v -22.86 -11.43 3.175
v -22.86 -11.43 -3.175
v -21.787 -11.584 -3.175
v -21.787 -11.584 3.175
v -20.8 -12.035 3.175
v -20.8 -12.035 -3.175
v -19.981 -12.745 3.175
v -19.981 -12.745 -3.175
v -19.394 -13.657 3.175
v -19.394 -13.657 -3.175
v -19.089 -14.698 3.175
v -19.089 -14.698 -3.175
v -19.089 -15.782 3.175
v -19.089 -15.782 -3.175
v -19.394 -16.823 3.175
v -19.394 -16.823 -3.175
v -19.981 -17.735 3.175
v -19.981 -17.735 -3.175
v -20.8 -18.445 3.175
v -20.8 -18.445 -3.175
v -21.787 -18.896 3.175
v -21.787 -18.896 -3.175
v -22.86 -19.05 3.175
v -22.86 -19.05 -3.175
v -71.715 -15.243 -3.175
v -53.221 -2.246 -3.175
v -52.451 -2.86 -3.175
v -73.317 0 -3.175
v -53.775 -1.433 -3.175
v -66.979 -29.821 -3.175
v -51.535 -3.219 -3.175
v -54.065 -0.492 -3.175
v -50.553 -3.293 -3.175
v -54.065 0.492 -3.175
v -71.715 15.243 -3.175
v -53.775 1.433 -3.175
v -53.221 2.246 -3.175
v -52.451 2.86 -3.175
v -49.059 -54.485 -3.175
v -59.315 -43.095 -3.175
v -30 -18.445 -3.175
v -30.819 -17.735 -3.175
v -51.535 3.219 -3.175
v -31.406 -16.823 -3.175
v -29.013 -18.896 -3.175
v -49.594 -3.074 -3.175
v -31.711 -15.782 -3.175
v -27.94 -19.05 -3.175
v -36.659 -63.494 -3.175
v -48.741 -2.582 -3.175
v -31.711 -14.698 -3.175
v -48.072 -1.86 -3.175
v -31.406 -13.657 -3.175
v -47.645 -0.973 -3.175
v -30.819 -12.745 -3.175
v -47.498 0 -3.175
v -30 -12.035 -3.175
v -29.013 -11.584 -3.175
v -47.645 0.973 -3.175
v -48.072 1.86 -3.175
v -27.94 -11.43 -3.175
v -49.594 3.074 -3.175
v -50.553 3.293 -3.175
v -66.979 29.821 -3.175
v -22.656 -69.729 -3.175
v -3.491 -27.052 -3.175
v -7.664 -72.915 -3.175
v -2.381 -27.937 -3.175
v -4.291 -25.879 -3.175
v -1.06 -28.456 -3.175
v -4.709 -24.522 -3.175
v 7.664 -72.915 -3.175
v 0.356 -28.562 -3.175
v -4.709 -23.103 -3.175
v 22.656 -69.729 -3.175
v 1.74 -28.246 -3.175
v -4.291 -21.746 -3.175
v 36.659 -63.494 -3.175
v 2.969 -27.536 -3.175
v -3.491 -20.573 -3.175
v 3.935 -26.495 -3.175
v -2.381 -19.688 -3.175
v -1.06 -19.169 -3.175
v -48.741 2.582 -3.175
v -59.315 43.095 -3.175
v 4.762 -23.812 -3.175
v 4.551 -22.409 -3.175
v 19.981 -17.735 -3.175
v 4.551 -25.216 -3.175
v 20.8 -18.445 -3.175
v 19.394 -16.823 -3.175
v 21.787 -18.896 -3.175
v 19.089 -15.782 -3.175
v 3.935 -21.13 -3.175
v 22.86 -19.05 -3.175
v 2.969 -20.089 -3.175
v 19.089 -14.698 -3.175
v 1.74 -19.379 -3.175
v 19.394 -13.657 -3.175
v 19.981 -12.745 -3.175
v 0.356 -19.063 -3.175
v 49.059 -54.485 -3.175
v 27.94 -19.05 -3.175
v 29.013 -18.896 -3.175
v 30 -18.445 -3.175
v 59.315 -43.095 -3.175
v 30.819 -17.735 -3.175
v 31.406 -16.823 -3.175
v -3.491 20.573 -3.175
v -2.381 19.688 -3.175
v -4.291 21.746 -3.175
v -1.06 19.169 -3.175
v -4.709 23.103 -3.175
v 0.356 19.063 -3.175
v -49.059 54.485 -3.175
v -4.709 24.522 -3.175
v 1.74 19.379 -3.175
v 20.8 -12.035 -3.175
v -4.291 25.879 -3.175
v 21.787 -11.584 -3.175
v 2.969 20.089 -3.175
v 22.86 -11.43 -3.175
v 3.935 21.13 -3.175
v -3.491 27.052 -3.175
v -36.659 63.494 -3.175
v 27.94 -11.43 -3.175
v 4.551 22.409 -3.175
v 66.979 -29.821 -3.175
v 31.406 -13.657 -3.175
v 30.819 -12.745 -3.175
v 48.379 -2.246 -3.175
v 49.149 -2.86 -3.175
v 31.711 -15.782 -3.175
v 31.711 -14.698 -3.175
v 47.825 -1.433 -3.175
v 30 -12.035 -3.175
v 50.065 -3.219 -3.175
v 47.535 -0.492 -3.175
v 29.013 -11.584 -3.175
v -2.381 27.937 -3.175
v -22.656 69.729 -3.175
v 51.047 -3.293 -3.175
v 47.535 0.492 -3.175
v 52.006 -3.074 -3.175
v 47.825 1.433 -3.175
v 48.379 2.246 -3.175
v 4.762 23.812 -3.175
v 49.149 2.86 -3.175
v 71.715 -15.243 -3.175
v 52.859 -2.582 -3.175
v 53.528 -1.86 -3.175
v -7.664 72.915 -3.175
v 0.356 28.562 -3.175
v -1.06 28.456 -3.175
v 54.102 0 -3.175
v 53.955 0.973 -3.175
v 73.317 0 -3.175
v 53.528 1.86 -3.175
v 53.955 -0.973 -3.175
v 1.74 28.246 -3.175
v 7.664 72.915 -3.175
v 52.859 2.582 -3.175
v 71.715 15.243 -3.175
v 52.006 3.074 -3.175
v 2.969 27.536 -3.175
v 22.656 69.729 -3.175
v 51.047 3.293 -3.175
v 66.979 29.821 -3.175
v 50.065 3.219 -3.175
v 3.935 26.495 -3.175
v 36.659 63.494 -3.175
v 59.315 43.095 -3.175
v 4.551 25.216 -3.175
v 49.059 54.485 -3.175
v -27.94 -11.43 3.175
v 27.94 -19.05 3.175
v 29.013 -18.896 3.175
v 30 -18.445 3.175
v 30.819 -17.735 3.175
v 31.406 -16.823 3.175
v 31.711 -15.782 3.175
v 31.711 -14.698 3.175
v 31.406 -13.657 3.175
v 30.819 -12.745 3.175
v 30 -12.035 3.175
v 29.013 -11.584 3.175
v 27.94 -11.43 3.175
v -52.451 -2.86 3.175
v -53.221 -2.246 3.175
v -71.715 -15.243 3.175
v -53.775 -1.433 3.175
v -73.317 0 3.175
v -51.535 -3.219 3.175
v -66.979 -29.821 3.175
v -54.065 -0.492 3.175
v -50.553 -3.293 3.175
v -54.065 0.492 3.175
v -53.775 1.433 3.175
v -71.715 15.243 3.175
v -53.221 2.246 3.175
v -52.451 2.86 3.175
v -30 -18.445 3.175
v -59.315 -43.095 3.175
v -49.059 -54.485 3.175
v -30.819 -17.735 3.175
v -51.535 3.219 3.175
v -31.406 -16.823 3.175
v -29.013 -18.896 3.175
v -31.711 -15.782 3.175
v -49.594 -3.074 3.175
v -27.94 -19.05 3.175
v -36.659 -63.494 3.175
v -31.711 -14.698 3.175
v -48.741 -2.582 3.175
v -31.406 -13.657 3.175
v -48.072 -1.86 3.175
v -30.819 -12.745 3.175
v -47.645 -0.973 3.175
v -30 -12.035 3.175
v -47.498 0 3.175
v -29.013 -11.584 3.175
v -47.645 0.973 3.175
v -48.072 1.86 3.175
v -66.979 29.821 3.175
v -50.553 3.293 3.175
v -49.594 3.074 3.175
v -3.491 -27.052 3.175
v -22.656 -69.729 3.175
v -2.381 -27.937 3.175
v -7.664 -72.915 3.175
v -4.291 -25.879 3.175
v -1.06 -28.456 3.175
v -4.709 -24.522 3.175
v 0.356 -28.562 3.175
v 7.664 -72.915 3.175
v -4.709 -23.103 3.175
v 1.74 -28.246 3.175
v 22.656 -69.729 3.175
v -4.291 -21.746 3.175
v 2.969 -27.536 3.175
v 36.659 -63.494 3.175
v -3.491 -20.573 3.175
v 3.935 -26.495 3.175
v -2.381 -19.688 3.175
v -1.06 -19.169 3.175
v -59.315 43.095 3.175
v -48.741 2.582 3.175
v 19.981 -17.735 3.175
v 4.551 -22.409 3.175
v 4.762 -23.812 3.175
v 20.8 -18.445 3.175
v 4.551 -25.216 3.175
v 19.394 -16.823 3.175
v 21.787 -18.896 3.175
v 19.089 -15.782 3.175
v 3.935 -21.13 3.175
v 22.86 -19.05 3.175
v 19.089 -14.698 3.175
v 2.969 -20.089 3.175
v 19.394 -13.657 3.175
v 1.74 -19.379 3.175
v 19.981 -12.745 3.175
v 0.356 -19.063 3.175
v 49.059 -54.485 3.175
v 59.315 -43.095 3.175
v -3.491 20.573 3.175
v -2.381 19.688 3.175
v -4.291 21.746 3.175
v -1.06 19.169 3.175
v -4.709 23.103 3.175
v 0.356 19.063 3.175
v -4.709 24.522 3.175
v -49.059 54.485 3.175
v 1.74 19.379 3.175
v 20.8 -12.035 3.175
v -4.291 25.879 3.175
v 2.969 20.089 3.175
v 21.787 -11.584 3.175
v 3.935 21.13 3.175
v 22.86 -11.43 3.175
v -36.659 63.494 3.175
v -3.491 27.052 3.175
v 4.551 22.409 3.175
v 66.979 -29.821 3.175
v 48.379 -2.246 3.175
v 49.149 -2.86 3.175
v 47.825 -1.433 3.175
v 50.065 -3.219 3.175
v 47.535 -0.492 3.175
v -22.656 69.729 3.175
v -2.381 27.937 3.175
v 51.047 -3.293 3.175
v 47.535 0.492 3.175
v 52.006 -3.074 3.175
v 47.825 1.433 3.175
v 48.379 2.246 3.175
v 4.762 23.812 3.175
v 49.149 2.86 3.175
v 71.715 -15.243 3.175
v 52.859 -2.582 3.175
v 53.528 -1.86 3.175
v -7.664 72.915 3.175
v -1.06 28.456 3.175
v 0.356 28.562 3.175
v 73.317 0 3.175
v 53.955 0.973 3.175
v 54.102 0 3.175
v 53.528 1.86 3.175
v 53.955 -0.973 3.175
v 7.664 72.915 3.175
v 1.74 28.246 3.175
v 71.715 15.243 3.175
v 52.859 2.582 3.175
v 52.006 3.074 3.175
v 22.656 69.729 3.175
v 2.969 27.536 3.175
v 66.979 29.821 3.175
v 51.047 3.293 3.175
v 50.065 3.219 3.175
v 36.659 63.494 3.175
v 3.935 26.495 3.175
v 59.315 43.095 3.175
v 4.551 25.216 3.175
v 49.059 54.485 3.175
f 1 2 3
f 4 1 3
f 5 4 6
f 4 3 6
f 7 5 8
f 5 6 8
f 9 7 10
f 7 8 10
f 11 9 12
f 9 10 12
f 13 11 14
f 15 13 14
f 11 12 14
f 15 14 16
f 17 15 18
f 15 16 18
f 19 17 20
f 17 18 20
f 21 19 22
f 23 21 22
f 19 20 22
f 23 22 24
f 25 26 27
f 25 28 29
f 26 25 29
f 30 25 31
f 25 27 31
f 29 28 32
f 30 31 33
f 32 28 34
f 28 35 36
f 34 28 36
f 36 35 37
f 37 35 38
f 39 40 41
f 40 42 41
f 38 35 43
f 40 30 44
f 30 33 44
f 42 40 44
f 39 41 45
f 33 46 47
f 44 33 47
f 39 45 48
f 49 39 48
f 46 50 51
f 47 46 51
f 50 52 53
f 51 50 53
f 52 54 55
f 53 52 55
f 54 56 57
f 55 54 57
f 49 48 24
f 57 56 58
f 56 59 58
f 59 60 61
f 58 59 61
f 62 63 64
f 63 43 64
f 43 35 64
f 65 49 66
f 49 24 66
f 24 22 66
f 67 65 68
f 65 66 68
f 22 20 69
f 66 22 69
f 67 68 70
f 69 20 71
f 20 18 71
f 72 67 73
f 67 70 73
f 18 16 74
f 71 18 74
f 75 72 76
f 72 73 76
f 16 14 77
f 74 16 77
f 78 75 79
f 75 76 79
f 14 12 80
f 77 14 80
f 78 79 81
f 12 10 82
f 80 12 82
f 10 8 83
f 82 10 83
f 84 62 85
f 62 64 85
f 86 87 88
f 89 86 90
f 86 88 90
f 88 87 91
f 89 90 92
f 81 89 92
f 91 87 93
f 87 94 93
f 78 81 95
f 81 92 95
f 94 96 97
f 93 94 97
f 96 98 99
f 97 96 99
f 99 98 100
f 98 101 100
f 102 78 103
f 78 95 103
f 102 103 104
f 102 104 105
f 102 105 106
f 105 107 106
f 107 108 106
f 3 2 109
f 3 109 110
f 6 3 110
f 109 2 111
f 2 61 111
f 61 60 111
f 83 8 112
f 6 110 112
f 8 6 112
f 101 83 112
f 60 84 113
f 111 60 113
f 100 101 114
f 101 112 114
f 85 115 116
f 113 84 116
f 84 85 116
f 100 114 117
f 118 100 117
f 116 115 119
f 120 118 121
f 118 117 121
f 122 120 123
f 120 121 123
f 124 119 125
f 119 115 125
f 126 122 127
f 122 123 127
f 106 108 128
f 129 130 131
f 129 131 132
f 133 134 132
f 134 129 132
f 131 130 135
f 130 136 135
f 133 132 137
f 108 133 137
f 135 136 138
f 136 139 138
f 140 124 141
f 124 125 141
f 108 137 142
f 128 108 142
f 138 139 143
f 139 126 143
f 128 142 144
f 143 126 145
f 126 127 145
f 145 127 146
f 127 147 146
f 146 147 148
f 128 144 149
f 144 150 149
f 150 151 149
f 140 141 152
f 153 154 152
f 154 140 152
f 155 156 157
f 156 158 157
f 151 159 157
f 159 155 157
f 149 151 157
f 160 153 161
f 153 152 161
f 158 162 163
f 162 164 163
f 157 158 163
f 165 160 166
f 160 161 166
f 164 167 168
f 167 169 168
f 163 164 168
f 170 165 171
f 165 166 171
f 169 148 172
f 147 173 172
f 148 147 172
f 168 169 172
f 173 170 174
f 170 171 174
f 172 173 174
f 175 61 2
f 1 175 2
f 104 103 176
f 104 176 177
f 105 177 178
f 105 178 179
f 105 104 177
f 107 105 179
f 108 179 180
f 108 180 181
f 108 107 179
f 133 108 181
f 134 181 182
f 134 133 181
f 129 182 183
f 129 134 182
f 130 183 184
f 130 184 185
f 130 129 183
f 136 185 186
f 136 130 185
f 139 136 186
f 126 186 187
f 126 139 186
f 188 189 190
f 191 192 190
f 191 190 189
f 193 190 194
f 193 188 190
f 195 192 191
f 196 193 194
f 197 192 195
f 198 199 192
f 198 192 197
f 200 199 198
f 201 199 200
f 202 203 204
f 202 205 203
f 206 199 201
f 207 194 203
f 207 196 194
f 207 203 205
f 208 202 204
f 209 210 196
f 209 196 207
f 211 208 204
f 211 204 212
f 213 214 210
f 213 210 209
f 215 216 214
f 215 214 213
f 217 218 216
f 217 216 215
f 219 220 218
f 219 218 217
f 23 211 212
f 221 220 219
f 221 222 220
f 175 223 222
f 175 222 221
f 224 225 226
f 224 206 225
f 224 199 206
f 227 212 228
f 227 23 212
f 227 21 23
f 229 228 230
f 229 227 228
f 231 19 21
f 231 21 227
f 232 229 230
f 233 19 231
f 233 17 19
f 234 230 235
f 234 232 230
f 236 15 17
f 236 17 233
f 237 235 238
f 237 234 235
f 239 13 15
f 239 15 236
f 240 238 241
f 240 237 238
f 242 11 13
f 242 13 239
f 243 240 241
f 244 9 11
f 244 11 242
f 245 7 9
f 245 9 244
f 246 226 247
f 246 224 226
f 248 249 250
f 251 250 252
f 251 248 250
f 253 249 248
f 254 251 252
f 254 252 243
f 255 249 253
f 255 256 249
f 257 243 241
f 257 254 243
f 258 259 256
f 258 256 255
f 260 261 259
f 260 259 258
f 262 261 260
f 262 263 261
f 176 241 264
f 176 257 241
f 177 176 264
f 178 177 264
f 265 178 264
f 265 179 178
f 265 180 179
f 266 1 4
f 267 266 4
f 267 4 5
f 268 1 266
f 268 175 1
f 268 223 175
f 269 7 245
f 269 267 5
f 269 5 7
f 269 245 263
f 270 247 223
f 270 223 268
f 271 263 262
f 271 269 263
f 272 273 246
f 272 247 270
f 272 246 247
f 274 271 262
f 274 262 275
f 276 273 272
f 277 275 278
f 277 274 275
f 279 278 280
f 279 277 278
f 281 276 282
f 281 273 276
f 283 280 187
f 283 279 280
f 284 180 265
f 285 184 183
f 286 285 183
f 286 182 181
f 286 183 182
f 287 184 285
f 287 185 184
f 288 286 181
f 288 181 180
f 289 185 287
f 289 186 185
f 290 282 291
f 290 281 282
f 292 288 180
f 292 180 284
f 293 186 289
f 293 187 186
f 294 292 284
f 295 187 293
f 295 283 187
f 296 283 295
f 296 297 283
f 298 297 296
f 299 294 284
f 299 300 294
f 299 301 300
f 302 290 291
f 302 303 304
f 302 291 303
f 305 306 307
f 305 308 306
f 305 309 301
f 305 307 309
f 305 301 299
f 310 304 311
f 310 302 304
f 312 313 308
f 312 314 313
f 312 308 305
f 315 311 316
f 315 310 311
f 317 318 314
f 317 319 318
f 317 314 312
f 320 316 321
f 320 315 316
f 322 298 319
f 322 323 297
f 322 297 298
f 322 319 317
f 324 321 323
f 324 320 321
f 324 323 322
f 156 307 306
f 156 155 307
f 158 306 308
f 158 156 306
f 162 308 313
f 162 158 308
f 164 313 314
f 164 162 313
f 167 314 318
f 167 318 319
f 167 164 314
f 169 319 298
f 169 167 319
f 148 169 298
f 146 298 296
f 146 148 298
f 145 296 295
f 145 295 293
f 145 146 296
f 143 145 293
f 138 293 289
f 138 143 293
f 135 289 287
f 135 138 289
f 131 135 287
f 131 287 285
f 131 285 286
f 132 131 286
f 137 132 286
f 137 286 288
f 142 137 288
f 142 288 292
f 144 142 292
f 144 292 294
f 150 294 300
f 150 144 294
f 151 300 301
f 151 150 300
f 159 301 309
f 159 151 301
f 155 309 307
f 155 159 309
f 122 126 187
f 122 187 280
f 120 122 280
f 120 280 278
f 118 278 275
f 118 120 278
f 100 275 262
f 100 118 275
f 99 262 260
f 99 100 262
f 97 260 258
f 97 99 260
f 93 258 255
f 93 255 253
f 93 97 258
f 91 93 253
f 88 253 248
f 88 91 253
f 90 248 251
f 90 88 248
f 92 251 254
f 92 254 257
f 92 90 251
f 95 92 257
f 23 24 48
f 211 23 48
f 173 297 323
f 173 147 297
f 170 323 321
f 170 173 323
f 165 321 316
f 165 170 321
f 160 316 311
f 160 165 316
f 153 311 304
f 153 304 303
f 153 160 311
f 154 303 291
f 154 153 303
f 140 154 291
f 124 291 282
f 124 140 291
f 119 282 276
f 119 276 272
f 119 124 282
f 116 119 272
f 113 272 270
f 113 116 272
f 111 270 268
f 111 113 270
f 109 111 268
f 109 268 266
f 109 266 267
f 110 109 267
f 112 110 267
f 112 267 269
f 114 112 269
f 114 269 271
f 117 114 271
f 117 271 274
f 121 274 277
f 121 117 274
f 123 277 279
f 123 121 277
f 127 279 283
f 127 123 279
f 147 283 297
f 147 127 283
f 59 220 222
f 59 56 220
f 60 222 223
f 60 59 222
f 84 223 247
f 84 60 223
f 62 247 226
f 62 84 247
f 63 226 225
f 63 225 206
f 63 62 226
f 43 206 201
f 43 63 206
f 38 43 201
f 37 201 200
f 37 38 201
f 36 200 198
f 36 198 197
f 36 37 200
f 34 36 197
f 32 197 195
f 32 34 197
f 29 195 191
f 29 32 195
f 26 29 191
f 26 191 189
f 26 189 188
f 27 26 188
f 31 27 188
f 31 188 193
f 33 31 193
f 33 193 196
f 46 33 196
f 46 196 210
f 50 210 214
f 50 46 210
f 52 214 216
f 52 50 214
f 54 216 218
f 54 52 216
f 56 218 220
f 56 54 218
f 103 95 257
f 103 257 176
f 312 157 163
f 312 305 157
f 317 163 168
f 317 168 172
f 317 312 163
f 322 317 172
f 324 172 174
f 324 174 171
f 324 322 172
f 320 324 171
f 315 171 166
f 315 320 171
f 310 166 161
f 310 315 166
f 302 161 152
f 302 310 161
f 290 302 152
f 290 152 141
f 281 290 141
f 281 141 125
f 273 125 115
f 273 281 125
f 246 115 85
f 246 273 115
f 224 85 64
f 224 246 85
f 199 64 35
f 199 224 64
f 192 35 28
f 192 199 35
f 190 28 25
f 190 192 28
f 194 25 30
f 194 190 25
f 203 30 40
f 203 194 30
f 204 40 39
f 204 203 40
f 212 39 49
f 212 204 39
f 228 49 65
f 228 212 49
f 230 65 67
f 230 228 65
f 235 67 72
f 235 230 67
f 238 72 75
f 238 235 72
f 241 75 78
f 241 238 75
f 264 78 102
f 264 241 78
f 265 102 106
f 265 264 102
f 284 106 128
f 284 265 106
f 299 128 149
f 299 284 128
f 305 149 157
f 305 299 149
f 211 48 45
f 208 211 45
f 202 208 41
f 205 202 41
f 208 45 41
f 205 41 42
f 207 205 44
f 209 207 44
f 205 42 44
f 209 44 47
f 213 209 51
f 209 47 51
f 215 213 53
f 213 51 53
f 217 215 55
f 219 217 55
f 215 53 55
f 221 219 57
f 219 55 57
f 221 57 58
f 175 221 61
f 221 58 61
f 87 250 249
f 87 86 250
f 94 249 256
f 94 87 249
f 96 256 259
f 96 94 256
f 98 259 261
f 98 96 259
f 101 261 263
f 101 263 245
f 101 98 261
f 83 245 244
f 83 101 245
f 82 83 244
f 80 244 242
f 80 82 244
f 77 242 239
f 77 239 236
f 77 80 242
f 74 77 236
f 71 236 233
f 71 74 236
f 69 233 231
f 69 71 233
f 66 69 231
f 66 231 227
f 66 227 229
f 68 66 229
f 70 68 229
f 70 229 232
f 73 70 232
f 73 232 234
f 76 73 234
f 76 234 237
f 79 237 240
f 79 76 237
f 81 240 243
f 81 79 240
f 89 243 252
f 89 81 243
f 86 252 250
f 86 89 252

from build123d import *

# Parameters (mm, degrees)
SKETCH2_R           = 73.3171
SKETCH2_R_2         = 3.302
SKETCH2_R_3         = 4.7625
BOSS_EXTRUDE1_DEPTH = 3.175
CUT_EXTRUDE1_DEPTH  = 6.35


with BuildPart() as part:
    # Sketch2 → Boss-Extrude1 (new, symmetric)
    with BuildSketch(Plane.XY):
        Circle(SKETCH2_R)
        with Locations((-50.8, 0)):
            Circle(SKETCH2_R_2, mode=Mode.SUBTRACT)
        with Locations((50.8, 0)):
            Circle(SKETCH2_R_2, mode=Mode.SUBTRACT)
        with Locations((0, 23.8125)):
            Circle(SKETCH2_R_3, mode=Mode.SUBTRACT)
        with Locations((0, -23.8125)):
            Circle(SKETCH2_R_3, mode=Mode.SUBTRACT)
    extrude(amount=BOSS_EXTRUDE1_DEPTH, both=True)

    # Sketch3 → Cut-Extrude1 (cut)
    with BuildSketch(Plane(origin=(0, 0, -3.175), x_dir=(-1, 0, 0), z_dir=(0, 0, -1))):
        with BuildLine():
            Line((-27.94, -11.43), (-22.86, -11.43))
            ThreePointArc((-22.86, -11.43), (-19.05, -15.24), (-22.86, -19.05))
            Line((-22.86, -19.05), (-27.94, -19.05))
            ThreePointArc((-27.94, -19.05), (-31.75, -15.24), (-27.94, -11.43))
        make_face()
    cut_extrude1 = extrude(amount=-CUT_EXTRUDE1_DEPTH, mode=Mode.SUBTRACT)

    # Mirror1: Cut-Extrude1 across plane
    add(cut_extrude1.mirror(Plane(origin=(0, 0, 0), x_dir=(0, 0, 1), z_dir=(1, 0, 0))), mode=Mode.SUBTRACT)


solid = part.part
